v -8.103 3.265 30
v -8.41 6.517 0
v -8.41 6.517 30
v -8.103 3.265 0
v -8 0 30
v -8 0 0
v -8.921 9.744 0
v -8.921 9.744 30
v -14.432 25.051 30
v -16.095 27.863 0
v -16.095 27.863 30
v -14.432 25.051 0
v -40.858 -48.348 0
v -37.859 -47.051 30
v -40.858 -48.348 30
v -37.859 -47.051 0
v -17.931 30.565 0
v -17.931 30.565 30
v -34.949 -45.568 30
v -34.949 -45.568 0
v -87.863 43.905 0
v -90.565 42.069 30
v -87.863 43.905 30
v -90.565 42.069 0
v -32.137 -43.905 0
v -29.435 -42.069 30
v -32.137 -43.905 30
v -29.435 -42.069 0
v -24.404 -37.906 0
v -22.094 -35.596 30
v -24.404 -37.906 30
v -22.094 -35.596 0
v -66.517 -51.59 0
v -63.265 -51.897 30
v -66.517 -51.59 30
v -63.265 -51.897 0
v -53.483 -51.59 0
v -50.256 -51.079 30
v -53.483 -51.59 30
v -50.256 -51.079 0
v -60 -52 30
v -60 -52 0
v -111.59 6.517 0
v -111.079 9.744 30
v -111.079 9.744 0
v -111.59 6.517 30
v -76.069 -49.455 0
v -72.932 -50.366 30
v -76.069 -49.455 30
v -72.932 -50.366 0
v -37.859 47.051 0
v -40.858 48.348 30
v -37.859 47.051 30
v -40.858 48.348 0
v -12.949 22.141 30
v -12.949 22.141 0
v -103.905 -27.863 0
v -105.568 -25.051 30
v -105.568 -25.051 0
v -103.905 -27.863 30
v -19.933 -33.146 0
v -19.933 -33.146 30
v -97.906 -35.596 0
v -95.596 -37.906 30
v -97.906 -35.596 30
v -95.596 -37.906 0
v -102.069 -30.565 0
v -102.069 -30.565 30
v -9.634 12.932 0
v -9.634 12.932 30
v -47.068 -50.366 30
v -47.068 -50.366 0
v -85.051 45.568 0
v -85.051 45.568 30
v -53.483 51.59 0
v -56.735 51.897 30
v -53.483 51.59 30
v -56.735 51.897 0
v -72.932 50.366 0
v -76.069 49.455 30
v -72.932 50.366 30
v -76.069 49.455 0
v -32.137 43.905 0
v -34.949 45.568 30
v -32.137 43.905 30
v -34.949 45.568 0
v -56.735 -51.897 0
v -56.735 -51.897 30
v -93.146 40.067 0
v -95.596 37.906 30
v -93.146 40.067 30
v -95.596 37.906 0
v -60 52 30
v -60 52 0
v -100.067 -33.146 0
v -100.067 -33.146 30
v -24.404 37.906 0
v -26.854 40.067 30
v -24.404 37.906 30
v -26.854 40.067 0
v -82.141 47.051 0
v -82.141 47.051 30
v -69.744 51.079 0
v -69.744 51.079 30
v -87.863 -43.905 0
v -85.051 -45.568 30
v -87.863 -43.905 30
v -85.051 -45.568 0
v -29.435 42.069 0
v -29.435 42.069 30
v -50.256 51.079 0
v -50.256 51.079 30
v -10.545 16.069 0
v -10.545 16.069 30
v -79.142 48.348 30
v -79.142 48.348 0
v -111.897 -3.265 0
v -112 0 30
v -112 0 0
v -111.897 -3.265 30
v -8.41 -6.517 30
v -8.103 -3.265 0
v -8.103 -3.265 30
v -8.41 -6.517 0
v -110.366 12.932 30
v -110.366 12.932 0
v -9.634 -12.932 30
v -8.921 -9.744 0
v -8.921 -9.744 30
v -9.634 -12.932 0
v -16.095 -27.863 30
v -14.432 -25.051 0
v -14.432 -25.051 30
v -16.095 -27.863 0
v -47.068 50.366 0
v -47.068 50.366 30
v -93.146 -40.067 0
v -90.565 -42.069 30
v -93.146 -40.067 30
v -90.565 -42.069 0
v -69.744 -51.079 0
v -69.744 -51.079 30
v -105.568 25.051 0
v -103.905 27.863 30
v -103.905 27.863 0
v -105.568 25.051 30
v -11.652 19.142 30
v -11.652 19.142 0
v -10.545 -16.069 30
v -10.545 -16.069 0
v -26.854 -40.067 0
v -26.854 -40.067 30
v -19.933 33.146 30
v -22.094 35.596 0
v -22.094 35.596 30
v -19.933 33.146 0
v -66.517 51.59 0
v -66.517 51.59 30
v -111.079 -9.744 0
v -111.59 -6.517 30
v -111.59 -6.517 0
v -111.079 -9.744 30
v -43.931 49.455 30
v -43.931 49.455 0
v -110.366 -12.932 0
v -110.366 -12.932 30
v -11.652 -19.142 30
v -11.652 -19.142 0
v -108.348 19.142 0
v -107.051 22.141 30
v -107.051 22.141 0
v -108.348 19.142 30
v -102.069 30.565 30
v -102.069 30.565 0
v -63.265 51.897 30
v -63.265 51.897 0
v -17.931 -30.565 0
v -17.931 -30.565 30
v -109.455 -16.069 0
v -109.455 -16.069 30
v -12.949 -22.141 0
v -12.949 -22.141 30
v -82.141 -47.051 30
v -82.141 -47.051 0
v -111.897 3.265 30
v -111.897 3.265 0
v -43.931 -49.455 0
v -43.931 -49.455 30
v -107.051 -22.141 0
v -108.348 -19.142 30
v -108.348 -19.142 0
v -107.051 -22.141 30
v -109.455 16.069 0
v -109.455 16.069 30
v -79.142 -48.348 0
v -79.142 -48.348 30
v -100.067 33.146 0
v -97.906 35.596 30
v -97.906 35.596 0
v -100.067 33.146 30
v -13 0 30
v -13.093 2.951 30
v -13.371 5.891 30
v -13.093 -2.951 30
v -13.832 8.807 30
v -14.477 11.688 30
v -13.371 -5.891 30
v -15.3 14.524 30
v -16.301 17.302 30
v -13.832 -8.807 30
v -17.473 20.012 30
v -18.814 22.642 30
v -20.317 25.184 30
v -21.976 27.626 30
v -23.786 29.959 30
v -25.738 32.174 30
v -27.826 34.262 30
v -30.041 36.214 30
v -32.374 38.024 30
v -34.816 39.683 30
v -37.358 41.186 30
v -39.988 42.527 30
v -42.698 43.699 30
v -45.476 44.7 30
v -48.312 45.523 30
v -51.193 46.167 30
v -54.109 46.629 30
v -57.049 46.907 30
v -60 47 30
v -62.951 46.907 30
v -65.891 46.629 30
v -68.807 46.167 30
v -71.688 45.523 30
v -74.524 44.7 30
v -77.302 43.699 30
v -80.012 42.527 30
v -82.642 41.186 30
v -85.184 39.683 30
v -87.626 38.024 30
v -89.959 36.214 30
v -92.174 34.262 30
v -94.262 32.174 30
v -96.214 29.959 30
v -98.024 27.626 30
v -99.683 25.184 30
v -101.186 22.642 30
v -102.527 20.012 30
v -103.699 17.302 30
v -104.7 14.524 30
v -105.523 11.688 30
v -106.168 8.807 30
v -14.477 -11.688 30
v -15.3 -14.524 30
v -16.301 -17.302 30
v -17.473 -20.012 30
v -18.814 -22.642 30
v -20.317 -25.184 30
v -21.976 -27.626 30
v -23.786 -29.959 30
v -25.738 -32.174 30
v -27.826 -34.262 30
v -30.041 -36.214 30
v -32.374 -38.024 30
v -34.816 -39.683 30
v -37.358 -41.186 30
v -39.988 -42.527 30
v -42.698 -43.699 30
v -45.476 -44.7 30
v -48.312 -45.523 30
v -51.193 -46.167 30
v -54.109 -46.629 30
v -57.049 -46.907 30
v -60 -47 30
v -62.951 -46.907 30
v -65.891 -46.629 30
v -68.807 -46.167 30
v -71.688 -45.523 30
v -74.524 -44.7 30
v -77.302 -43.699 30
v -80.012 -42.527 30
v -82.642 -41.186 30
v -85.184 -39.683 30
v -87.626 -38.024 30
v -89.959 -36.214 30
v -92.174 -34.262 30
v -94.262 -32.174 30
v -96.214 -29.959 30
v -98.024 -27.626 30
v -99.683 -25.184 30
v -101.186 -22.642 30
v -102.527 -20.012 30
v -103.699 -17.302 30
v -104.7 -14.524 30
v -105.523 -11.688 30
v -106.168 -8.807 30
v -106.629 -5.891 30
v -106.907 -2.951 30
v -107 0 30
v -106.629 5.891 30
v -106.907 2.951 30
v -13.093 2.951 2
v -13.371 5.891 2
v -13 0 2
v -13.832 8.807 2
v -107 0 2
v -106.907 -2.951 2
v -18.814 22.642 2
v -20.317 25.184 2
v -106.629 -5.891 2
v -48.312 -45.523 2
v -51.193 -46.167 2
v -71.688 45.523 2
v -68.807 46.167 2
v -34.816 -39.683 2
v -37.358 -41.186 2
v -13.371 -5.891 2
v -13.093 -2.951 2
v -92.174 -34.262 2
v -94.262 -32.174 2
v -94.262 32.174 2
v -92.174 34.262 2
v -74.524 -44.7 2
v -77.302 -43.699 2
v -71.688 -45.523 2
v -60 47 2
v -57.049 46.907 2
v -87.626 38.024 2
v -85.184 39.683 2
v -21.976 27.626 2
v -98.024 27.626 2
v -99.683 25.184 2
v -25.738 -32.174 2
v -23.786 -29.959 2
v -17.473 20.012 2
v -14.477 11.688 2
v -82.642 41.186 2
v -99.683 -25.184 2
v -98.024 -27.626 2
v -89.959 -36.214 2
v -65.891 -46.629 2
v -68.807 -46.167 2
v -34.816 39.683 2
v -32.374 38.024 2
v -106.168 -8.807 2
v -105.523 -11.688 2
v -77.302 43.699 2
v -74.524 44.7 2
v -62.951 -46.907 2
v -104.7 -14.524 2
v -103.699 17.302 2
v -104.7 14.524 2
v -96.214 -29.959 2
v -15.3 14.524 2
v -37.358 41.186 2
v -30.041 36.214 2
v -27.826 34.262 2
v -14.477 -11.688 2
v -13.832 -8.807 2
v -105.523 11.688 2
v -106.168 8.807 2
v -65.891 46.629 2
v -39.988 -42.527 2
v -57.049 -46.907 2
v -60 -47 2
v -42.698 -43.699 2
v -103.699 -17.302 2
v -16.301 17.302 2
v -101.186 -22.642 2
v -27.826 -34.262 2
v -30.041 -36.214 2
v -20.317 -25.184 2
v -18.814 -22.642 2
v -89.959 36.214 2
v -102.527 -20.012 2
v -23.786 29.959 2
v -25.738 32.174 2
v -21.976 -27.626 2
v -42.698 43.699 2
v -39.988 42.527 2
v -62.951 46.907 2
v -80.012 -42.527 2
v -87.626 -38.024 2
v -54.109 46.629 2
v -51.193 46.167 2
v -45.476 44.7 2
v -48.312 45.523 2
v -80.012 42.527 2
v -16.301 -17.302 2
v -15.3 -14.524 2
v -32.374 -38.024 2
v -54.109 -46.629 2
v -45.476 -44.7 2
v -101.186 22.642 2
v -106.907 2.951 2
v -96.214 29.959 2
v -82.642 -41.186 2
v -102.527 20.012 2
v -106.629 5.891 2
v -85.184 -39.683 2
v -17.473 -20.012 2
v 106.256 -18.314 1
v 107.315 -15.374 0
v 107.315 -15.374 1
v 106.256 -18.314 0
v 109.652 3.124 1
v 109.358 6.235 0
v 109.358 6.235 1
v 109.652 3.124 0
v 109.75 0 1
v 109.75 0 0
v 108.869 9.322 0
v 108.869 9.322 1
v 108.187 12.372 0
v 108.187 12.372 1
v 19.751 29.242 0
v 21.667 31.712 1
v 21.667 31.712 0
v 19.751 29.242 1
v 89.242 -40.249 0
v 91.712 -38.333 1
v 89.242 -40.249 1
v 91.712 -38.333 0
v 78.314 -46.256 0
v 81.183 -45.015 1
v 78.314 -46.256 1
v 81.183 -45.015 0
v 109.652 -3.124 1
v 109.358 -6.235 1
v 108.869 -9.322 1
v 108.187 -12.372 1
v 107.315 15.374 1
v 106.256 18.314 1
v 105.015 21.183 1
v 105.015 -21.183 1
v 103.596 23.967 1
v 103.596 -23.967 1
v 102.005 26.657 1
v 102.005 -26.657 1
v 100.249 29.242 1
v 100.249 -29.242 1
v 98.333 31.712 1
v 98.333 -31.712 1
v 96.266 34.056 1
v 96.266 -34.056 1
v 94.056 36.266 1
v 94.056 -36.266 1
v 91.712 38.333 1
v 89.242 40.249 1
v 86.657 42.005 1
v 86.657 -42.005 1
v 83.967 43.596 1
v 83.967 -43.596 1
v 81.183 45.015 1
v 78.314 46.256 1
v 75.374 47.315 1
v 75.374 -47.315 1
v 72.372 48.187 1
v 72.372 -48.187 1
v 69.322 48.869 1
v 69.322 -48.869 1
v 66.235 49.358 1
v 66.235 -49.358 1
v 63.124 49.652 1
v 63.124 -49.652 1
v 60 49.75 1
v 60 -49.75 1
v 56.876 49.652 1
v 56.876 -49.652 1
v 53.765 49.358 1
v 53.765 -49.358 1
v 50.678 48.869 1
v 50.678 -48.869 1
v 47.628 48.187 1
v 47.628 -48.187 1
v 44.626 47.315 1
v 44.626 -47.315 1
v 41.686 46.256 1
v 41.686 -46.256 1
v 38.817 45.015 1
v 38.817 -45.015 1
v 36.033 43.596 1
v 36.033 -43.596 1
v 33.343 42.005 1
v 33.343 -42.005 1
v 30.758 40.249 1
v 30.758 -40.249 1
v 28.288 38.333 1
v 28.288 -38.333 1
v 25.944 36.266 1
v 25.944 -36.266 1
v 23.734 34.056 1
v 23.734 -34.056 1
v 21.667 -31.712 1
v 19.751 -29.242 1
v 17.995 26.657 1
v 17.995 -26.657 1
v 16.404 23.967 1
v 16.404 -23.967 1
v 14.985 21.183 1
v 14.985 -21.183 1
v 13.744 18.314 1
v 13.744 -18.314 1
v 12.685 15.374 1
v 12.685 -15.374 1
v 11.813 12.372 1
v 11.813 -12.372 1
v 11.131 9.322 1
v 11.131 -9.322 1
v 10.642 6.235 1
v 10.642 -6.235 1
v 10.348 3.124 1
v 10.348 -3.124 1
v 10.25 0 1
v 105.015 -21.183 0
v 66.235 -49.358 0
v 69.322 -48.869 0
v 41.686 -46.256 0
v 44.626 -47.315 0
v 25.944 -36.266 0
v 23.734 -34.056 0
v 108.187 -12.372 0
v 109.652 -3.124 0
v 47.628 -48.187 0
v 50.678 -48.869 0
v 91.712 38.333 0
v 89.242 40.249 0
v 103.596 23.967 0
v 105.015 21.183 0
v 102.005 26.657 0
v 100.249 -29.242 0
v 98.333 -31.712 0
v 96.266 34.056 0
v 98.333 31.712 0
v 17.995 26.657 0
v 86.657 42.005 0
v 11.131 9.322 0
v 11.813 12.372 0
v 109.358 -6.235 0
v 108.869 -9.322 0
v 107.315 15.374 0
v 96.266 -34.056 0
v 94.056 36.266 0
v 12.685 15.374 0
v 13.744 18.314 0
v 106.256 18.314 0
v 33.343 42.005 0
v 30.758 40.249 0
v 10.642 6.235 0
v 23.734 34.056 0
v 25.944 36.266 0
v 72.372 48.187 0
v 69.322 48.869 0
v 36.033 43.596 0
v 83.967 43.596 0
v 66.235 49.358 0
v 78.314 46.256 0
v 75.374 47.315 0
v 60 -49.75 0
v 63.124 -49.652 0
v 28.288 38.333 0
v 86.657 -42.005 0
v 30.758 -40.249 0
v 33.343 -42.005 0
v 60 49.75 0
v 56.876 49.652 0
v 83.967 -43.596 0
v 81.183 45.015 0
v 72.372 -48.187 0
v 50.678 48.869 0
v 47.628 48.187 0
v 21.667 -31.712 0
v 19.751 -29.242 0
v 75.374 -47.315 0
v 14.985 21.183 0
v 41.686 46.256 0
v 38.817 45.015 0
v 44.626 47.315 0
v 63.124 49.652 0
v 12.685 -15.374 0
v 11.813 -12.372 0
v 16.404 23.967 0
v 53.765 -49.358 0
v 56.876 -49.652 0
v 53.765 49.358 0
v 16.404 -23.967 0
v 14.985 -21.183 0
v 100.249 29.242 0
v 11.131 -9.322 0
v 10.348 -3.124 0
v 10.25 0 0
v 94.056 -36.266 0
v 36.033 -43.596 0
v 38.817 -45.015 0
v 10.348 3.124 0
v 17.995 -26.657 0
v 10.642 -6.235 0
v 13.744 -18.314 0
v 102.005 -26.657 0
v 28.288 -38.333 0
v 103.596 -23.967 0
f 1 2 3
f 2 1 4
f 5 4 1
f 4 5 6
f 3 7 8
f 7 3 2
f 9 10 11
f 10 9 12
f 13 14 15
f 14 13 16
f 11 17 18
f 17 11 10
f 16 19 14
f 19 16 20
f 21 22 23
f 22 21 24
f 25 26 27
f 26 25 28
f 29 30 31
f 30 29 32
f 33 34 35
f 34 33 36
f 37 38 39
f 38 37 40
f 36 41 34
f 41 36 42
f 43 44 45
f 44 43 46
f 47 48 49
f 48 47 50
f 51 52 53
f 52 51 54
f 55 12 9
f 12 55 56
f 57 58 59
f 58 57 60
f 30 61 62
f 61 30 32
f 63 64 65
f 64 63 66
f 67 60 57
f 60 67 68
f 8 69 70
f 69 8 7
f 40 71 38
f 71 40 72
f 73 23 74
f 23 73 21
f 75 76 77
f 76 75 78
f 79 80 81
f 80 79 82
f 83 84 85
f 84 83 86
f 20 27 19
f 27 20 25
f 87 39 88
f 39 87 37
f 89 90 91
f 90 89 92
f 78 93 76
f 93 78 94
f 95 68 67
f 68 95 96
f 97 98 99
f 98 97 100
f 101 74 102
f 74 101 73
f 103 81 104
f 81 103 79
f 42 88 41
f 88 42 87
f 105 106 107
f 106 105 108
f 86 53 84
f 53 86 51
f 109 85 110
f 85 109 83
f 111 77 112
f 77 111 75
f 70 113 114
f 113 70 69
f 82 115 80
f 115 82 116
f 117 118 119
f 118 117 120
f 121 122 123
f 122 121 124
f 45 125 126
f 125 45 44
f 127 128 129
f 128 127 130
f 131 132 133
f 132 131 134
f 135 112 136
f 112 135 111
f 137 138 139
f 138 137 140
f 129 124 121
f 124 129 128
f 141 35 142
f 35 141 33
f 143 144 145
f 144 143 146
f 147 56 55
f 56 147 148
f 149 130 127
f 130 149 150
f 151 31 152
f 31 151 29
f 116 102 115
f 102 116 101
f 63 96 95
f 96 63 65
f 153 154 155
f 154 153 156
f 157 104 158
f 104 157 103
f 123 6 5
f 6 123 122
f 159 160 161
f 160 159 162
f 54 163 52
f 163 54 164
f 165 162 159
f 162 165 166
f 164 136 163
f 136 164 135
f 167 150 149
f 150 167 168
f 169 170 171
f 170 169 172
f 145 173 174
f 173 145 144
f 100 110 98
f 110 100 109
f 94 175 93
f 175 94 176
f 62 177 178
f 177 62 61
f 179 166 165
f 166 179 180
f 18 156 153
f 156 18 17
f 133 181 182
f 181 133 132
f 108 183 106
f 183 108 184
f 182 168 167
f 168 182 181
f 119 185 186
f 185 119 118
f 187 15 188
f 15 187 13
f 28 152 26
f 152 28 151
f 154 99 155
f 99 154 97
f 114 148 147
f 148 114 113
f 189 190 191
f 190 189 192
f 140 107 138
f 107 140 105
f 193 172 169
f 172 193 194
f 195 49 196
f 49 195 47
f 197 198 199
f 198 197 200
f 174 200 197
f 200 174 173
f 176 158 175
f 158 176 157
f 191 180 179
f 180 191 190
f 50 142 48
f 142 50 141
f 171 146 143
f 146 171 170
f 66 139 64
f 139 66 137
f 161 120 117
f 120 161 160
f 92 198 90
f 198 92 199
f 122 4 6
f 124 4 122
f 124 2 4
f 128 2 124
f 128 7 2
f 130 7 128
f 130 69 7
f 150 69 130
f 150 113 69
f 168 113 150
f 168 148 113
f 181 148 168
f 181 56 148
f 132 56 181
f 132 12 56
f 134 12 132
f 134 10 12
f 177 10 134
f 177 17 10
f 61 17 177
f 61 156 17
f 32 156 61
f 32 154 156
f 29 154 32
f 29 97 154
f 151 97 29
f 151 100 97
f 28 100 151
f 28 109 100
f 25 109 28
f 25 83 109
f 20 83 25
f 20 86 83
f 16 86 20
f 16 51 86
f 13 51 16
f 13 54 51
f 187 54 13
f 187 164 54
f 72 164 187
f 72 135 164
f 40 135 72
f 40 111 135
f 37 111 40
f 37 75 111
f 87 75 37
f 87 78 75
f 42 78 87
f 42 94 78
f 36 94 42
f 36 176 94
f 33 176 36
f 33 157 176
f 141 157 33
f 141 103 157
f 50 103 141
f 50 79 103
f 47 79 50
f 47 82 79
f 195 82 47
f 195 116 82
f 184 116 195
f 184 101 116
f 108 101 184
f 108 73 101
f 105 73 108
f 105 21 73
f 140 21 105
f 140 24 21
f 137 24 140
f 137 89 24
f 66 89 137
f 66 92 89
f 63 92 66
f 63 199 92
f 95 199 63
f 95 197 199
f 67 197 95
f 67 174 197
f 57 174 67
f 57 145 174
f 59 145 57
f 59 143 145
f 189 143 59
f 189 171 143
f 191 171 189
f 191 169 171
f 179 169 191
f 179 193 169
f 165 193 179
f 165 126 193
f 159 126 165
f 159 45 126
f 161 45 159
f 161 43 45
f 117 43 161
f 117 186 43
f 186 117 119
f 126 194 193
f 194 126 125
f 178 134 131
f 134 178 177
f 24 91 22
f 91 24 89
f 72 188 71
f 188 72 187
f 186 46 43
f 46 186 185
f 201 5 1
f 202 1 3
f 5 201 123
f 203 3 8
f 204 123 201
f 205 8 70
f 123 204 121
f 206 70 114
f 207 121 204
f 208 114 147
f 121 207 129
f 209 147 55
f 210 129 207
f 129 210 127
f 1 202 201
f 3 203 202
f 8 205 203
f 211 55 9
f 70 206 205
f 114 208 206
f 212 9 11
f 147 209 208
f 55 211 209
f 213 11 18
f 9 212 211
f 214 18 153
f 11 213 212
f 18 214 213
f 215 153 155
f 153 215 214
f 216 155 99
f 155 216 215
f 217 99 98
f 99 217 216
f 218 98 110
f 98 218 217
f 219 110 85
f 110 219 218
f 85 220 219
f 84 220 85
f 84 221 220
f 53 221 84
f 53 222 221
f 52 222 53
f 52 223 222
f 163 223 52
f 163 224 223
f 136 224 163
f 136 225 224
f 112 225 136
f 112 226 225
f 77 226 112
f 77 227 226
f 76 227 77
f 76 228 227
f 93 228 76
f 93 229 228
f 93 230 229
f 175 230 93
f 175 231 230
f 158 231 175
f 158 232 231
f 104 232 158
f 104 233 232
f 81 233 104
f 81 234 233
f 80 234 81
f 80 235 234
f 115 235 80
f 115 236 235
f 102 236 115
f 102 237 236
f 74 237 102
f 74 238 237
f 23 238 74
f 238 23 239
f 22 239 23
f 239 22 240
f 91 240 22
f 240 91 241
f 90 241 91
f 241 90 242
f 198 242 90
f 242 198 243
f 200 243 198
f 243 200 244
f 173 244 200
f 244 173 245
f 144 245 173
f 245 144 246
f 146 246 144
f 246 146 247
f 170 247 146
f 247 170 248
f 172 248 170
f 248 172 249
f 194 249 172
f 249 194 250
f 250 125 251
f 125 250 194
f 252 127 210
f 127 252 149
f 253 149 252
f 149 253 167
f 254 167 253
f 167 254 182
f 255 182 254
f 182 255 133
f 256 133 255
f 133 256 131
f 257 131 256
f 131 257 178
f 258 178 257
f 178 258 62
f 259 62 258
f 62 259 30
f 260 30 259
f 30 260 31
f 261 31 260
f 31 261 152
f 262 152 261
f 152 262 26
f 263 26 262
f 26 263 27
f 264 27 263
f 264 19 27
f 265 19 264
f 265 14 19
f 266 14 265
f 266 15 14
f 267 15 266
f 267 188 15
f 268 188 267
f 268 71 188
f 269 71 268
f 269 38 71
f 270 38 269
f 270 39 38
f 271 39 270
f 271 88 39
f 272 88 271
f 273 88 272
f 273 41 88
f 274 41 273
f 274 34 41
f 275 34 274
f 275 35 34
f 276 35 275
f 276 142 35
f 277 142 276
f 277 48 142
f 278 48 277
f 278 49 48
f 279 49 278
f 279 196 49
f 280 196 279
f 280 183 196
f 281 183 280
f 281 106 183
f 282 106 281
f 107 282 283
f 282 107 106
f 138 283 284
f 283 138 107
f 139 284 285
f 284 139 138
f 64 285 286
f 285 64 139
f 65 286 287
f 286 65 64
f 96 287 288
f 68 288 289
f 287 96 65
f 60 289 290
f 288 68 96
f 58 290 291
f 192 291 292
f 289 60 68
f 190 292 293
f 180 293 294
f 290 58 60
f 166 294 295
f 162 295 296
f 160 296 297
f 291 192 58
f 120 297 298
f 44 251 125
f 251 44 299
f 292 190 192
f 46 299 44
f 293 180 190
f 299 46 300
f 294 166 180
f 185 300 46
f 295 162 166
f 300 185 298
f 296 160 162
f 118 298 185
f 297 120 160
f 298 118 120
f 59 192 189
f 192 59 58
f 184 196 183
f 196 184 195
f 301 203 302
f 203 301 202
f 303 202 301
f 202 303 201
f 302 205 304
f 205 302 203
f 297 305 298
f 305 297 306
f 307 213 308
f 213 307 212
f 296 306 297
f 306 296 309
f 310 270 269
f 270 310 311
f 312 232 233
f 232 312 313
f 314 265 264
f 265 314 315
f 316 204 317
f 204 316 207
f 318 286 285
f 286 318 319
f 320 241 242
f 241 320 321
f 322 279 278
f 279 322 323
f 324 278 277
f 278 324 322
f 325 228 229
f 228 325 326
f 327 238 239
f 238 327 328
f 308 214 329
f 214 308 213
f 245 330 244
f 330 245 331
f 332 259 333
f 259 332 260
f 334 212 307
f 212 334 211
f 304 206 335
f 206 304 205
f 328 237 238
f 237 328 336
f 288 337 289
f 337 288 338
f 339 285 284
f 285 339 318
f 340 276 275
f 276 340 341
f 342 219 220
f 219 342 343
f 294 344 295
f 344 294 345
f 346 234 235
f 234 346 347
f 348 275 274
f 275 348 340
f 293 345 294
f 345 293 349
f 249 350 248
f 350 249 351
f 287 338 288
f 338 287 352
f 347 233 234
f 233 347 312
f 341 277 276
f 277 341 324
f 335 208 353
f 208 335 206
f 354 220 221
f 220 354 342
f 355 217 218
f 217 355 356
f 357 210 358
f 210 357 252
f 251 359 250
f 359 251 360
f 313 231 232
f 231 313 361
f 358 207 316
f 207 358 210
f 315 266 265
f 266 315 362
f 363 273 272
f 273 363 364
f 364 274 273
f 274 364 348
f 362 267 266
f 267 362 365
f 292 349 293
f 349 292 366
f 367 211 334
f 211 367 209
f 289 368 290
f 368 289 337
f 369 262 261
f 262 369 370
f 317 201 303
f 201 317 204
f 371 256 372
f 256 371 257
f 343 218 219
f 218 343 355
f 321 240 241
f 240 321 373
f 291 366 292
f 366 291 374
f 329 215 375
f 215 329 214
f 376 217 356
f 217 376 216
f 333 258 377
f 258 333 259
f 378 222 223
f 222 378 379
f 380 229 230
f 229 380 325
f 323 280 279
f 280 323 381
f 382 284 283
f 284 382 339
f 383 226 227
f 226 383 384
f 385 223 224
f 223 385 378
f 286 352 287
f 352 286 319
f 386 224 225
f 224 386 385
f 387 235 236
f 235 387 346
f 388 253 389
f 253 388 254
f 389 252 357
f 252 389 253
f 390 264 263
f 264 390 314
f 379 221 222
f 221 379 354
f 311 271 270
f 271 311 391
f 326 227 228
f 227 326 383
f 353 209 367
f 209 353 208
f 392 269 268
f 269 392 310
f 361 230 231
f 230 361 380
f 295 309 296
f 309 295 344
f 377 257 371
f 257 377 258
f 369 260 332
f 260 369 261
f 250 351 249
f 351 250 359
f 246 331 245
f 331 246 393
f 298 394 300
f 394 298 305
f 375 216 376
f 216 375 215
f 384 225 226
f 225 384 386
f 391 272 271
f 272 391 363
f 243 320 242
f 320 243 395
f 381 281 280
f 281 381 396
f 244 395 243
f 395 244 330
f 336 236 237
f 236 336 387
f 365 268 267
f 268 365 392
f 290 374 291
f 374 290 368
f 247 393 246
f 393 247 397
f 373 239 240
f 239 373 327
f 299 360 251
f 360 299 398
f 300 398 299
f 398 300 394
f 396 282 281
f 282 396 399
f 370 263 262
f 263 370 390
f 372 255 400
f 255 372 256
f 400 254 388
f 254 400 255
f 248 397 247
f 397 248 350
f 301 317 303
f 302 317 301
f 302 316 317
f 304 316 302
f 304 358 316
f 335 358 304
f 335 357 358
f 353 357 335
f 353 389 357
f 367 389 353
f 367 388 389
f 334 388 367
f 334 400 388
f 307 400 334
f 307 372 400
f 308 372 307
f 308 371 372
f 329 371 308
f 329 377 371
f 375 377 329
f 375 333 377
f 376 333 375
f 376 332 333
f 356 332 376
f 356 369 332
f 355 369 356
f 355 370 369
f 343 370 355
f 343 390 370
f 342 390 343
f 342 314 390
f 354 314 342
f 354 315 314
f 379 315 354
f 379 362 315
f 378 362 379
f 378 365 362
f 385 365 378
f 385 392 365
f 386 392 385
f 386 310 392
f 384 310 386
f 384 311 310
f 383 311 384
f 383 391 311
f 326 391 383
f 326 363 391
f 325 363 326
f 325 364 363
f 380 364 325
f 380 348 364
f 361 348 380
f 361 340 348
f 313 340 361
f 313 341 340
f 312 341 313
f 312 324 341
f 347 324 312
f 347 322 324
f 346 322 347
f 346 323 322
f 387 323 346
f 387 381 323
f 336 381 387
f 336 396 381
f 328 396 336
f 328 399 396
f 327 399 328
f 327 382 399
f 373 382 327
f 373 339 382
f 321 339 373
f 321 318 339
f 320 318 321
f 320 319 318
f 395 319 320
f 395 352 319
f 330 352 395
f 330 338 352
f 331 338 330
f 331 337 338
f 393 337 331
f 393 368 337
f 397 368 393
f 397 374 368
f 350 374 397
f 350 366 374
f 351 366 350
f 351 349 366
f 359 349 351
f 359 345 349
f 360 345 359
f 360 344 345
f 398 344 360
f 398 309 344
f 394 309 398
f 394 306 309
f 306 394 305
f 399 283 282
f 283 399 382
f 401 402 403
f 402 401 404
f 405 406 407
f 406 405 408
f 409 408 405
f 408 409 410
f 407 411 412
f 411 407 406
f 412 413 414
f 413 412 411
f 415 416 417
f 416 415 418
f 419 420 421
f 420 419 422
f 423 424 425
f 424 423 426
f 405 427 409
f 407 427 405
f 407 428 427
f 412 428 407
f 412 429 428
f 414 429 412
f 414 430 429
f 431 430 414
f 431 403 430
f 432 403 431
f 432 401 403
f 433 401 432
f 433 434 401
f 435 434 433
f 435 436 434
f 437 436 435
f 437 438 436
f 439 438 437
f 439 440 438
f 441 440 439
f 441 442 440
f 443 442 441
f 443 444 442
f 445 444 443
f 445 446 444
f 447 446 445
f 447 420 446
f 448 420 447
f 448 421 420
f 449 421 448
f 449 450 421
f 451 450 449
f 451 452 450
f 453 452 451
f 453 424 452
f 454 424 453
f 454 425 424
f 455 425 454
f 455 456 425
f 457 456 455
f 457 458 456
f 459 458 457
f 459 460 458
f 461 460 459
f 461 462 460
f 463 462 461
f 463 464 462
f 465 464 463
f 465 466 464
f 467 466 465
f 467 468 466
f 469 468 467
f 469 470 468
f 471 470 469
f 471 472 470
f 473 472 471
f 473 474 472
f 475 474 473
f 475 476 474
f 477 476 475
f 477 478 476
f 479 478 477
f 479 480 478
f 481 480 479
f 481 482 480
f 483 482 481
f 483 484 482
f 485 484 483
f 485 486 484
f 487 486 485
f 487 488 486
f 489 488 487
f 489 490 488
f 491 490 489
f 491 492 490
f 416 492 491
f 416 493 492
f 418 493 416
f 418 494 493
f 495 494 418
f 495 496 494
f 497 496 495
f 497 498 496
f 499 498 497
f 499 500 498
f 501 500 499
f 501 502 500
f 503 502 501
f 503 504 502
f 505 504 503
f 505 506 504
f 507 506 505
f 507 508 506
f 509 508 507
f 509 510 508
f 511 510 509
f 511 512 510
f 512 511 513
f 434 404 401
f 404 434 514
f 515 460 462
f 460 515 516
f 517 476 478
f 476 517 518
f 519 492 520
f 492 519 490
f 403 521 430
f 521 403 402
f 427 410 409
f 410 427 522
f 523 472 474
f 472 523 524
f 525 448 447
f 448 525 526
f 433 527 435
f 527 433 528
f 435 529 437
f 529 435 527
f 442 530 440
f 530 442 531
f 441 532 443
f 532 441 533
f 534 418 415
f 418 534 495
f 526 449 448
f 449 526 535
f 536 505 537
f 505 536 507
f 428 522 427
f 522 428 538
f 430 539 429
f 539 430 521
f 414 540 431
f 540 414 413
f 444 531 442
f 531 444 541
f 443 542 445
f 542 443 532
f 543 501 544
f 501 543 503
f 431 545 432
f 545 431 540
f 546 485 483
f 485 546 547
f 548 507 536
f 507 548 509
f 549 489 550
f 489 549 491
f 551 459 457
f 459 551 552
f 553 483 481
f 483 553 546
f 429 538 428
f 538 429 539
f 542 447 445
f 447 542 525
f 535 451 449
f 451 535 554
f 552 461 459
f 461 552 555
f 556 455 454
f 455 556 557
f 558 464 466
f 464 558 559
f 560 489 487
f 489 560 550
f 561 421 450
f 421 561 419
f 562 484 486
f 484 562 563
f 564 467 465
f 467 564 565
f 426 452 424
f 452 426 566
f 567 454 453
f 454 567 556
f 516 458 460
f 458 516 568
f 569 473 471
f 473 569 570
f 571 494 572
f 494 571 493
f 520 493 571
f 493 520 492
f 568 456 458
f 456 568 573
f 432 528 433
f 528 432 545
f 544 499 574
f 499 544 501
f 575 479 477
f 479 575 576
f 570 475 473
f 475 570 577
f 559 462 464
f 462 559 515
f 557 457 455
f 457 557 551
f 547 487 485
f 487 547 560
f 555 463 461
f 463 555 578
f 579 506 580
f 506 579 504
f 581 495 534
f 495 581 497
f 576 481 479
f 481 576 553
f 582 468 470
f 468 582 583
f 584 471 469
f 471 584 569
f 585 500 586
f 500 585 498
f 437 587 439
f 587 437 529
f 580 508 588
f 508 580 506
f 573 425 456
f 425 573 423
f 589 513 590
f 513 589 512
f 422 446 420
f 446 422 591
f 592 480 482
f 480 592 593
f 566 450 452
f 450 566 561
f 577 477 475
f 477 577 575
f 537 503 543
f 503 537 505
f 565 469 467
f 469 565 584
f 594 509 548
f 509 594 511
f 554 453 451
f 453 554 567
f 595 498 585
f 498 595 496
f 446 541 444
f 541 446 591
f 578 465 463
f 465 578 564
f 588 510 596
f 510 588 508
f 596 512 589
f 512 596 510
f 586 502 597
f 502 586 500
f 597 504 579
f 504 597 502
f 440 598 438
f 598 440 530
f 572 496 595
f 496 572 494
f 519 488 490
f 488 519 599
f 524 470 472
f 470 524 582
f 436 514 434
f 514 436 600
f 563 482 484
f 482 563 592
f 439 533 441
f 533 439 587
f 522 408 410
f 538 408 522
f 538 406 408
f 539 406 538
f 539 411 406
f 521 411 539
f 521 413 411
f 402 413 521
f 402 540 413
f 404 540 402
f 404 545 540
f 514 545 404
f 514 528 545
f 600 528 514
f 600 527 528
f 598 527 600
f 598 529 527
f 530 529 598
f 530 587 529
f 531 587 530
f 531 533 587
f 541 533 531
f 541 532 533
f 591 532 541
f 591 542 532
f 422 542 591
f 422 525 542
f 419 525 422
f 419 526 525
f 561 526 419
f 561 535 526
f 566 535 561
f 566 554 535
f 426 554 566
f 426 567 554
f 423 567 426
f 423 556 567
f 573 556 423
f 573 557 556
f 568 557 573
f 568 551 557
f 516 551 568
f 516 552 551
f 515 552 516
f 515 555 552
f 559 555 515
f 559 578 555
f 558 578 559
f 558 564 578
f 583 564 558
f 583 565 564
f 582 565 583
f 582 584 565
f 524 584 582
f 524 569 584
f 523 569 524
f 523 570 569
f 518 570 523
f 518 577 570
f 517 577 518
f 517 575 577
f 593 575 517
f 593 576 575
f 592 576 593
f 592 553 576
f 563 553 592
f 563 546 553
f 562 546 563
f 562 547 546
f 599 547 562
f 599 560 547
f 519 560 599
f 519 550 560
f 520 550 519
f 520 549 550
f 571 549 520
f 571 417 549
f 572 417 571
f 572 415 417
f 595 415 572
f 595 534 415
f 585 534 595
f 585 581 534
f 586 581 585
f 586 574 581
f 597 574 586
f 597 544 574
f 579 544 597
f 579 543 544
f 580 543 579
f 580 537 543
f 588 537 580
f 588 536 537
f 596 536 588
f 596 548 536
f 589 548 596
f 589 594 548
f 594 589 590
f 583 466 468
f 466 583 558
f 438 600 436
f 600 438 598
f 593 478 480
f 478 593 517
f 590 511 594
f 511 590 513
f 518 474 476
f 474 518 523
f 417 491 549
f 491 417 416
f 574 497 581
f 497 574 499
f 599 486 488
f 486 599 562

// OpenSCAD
// ==========================================
//   MULTI-TILT DIFFUSION SIGN ENGINE
// ==========================================

// [USER SETTINGS]
Height_Map_File = "Custom_Sign_HeightMap.png";
Sign_Size = 100.0;
Relief_Depth = 2.0; // The "Thin Trace" intensity
Channel_Width = 6.0;

// [RENDERING LOGIC]
$fn = 100;

module base_shape() {
    // Creates a basic cylinder shape scaled to the image
    // In a V2, we would trace the exact outline, but for now we use a puck
    cylinder(h=30, d=Sign_Size);
}

module diffusion_layer() {
    // This is the GAME KILLER
    // It reads the PNG pixel data and converts it into physical geometry
    translate([0, 0, 28]) // Move to top of sign
    intersection() {
        // Crop the map to the sign shape
        cylinder(h=10, d=Sign_Size - 2);
        
        // The Surface Map
        translate([0, 0, 0])
        resize([Sign_Size, Sign_Size, Relief_Depth])
        surface(file = Height_Map_File, center = true, invert = false);
    }
}

module main_body() {
    difference() {
        // Outer Shell
        cylinder(h=30, d=Sign_Size + 4);
        
        // Inner Light Channel
        translate([0,0,2])
        cylinder(h=31, d=Sign_Size - Channel_Width);
    }
}

// --- ASSEMBLY ---

// 1. The Main Housing (Black PLA)
translate([-Sign_Size*0.6, 0, 0]) {
    color("Black") main_body();
    // Add Friction Lip
    translate([0,0,28])
    difference() {
        cylinder(h=2, d=Sign_Size);
        cylinder(h=3, d=Sign_Size - 2);
    }
}

// 2. The Multi-Tilt Diffuser (White PLA)
translate([Sign_Size*0.6, 0, 0]) {
    color("White") 
    union() {
        // Base Diffuser Plate
        cylinder(h=1, d=Sign_Size - 0.5);
        
        // The "Thin Trace" Image Layer
        diffusion_layer();
    }
}
